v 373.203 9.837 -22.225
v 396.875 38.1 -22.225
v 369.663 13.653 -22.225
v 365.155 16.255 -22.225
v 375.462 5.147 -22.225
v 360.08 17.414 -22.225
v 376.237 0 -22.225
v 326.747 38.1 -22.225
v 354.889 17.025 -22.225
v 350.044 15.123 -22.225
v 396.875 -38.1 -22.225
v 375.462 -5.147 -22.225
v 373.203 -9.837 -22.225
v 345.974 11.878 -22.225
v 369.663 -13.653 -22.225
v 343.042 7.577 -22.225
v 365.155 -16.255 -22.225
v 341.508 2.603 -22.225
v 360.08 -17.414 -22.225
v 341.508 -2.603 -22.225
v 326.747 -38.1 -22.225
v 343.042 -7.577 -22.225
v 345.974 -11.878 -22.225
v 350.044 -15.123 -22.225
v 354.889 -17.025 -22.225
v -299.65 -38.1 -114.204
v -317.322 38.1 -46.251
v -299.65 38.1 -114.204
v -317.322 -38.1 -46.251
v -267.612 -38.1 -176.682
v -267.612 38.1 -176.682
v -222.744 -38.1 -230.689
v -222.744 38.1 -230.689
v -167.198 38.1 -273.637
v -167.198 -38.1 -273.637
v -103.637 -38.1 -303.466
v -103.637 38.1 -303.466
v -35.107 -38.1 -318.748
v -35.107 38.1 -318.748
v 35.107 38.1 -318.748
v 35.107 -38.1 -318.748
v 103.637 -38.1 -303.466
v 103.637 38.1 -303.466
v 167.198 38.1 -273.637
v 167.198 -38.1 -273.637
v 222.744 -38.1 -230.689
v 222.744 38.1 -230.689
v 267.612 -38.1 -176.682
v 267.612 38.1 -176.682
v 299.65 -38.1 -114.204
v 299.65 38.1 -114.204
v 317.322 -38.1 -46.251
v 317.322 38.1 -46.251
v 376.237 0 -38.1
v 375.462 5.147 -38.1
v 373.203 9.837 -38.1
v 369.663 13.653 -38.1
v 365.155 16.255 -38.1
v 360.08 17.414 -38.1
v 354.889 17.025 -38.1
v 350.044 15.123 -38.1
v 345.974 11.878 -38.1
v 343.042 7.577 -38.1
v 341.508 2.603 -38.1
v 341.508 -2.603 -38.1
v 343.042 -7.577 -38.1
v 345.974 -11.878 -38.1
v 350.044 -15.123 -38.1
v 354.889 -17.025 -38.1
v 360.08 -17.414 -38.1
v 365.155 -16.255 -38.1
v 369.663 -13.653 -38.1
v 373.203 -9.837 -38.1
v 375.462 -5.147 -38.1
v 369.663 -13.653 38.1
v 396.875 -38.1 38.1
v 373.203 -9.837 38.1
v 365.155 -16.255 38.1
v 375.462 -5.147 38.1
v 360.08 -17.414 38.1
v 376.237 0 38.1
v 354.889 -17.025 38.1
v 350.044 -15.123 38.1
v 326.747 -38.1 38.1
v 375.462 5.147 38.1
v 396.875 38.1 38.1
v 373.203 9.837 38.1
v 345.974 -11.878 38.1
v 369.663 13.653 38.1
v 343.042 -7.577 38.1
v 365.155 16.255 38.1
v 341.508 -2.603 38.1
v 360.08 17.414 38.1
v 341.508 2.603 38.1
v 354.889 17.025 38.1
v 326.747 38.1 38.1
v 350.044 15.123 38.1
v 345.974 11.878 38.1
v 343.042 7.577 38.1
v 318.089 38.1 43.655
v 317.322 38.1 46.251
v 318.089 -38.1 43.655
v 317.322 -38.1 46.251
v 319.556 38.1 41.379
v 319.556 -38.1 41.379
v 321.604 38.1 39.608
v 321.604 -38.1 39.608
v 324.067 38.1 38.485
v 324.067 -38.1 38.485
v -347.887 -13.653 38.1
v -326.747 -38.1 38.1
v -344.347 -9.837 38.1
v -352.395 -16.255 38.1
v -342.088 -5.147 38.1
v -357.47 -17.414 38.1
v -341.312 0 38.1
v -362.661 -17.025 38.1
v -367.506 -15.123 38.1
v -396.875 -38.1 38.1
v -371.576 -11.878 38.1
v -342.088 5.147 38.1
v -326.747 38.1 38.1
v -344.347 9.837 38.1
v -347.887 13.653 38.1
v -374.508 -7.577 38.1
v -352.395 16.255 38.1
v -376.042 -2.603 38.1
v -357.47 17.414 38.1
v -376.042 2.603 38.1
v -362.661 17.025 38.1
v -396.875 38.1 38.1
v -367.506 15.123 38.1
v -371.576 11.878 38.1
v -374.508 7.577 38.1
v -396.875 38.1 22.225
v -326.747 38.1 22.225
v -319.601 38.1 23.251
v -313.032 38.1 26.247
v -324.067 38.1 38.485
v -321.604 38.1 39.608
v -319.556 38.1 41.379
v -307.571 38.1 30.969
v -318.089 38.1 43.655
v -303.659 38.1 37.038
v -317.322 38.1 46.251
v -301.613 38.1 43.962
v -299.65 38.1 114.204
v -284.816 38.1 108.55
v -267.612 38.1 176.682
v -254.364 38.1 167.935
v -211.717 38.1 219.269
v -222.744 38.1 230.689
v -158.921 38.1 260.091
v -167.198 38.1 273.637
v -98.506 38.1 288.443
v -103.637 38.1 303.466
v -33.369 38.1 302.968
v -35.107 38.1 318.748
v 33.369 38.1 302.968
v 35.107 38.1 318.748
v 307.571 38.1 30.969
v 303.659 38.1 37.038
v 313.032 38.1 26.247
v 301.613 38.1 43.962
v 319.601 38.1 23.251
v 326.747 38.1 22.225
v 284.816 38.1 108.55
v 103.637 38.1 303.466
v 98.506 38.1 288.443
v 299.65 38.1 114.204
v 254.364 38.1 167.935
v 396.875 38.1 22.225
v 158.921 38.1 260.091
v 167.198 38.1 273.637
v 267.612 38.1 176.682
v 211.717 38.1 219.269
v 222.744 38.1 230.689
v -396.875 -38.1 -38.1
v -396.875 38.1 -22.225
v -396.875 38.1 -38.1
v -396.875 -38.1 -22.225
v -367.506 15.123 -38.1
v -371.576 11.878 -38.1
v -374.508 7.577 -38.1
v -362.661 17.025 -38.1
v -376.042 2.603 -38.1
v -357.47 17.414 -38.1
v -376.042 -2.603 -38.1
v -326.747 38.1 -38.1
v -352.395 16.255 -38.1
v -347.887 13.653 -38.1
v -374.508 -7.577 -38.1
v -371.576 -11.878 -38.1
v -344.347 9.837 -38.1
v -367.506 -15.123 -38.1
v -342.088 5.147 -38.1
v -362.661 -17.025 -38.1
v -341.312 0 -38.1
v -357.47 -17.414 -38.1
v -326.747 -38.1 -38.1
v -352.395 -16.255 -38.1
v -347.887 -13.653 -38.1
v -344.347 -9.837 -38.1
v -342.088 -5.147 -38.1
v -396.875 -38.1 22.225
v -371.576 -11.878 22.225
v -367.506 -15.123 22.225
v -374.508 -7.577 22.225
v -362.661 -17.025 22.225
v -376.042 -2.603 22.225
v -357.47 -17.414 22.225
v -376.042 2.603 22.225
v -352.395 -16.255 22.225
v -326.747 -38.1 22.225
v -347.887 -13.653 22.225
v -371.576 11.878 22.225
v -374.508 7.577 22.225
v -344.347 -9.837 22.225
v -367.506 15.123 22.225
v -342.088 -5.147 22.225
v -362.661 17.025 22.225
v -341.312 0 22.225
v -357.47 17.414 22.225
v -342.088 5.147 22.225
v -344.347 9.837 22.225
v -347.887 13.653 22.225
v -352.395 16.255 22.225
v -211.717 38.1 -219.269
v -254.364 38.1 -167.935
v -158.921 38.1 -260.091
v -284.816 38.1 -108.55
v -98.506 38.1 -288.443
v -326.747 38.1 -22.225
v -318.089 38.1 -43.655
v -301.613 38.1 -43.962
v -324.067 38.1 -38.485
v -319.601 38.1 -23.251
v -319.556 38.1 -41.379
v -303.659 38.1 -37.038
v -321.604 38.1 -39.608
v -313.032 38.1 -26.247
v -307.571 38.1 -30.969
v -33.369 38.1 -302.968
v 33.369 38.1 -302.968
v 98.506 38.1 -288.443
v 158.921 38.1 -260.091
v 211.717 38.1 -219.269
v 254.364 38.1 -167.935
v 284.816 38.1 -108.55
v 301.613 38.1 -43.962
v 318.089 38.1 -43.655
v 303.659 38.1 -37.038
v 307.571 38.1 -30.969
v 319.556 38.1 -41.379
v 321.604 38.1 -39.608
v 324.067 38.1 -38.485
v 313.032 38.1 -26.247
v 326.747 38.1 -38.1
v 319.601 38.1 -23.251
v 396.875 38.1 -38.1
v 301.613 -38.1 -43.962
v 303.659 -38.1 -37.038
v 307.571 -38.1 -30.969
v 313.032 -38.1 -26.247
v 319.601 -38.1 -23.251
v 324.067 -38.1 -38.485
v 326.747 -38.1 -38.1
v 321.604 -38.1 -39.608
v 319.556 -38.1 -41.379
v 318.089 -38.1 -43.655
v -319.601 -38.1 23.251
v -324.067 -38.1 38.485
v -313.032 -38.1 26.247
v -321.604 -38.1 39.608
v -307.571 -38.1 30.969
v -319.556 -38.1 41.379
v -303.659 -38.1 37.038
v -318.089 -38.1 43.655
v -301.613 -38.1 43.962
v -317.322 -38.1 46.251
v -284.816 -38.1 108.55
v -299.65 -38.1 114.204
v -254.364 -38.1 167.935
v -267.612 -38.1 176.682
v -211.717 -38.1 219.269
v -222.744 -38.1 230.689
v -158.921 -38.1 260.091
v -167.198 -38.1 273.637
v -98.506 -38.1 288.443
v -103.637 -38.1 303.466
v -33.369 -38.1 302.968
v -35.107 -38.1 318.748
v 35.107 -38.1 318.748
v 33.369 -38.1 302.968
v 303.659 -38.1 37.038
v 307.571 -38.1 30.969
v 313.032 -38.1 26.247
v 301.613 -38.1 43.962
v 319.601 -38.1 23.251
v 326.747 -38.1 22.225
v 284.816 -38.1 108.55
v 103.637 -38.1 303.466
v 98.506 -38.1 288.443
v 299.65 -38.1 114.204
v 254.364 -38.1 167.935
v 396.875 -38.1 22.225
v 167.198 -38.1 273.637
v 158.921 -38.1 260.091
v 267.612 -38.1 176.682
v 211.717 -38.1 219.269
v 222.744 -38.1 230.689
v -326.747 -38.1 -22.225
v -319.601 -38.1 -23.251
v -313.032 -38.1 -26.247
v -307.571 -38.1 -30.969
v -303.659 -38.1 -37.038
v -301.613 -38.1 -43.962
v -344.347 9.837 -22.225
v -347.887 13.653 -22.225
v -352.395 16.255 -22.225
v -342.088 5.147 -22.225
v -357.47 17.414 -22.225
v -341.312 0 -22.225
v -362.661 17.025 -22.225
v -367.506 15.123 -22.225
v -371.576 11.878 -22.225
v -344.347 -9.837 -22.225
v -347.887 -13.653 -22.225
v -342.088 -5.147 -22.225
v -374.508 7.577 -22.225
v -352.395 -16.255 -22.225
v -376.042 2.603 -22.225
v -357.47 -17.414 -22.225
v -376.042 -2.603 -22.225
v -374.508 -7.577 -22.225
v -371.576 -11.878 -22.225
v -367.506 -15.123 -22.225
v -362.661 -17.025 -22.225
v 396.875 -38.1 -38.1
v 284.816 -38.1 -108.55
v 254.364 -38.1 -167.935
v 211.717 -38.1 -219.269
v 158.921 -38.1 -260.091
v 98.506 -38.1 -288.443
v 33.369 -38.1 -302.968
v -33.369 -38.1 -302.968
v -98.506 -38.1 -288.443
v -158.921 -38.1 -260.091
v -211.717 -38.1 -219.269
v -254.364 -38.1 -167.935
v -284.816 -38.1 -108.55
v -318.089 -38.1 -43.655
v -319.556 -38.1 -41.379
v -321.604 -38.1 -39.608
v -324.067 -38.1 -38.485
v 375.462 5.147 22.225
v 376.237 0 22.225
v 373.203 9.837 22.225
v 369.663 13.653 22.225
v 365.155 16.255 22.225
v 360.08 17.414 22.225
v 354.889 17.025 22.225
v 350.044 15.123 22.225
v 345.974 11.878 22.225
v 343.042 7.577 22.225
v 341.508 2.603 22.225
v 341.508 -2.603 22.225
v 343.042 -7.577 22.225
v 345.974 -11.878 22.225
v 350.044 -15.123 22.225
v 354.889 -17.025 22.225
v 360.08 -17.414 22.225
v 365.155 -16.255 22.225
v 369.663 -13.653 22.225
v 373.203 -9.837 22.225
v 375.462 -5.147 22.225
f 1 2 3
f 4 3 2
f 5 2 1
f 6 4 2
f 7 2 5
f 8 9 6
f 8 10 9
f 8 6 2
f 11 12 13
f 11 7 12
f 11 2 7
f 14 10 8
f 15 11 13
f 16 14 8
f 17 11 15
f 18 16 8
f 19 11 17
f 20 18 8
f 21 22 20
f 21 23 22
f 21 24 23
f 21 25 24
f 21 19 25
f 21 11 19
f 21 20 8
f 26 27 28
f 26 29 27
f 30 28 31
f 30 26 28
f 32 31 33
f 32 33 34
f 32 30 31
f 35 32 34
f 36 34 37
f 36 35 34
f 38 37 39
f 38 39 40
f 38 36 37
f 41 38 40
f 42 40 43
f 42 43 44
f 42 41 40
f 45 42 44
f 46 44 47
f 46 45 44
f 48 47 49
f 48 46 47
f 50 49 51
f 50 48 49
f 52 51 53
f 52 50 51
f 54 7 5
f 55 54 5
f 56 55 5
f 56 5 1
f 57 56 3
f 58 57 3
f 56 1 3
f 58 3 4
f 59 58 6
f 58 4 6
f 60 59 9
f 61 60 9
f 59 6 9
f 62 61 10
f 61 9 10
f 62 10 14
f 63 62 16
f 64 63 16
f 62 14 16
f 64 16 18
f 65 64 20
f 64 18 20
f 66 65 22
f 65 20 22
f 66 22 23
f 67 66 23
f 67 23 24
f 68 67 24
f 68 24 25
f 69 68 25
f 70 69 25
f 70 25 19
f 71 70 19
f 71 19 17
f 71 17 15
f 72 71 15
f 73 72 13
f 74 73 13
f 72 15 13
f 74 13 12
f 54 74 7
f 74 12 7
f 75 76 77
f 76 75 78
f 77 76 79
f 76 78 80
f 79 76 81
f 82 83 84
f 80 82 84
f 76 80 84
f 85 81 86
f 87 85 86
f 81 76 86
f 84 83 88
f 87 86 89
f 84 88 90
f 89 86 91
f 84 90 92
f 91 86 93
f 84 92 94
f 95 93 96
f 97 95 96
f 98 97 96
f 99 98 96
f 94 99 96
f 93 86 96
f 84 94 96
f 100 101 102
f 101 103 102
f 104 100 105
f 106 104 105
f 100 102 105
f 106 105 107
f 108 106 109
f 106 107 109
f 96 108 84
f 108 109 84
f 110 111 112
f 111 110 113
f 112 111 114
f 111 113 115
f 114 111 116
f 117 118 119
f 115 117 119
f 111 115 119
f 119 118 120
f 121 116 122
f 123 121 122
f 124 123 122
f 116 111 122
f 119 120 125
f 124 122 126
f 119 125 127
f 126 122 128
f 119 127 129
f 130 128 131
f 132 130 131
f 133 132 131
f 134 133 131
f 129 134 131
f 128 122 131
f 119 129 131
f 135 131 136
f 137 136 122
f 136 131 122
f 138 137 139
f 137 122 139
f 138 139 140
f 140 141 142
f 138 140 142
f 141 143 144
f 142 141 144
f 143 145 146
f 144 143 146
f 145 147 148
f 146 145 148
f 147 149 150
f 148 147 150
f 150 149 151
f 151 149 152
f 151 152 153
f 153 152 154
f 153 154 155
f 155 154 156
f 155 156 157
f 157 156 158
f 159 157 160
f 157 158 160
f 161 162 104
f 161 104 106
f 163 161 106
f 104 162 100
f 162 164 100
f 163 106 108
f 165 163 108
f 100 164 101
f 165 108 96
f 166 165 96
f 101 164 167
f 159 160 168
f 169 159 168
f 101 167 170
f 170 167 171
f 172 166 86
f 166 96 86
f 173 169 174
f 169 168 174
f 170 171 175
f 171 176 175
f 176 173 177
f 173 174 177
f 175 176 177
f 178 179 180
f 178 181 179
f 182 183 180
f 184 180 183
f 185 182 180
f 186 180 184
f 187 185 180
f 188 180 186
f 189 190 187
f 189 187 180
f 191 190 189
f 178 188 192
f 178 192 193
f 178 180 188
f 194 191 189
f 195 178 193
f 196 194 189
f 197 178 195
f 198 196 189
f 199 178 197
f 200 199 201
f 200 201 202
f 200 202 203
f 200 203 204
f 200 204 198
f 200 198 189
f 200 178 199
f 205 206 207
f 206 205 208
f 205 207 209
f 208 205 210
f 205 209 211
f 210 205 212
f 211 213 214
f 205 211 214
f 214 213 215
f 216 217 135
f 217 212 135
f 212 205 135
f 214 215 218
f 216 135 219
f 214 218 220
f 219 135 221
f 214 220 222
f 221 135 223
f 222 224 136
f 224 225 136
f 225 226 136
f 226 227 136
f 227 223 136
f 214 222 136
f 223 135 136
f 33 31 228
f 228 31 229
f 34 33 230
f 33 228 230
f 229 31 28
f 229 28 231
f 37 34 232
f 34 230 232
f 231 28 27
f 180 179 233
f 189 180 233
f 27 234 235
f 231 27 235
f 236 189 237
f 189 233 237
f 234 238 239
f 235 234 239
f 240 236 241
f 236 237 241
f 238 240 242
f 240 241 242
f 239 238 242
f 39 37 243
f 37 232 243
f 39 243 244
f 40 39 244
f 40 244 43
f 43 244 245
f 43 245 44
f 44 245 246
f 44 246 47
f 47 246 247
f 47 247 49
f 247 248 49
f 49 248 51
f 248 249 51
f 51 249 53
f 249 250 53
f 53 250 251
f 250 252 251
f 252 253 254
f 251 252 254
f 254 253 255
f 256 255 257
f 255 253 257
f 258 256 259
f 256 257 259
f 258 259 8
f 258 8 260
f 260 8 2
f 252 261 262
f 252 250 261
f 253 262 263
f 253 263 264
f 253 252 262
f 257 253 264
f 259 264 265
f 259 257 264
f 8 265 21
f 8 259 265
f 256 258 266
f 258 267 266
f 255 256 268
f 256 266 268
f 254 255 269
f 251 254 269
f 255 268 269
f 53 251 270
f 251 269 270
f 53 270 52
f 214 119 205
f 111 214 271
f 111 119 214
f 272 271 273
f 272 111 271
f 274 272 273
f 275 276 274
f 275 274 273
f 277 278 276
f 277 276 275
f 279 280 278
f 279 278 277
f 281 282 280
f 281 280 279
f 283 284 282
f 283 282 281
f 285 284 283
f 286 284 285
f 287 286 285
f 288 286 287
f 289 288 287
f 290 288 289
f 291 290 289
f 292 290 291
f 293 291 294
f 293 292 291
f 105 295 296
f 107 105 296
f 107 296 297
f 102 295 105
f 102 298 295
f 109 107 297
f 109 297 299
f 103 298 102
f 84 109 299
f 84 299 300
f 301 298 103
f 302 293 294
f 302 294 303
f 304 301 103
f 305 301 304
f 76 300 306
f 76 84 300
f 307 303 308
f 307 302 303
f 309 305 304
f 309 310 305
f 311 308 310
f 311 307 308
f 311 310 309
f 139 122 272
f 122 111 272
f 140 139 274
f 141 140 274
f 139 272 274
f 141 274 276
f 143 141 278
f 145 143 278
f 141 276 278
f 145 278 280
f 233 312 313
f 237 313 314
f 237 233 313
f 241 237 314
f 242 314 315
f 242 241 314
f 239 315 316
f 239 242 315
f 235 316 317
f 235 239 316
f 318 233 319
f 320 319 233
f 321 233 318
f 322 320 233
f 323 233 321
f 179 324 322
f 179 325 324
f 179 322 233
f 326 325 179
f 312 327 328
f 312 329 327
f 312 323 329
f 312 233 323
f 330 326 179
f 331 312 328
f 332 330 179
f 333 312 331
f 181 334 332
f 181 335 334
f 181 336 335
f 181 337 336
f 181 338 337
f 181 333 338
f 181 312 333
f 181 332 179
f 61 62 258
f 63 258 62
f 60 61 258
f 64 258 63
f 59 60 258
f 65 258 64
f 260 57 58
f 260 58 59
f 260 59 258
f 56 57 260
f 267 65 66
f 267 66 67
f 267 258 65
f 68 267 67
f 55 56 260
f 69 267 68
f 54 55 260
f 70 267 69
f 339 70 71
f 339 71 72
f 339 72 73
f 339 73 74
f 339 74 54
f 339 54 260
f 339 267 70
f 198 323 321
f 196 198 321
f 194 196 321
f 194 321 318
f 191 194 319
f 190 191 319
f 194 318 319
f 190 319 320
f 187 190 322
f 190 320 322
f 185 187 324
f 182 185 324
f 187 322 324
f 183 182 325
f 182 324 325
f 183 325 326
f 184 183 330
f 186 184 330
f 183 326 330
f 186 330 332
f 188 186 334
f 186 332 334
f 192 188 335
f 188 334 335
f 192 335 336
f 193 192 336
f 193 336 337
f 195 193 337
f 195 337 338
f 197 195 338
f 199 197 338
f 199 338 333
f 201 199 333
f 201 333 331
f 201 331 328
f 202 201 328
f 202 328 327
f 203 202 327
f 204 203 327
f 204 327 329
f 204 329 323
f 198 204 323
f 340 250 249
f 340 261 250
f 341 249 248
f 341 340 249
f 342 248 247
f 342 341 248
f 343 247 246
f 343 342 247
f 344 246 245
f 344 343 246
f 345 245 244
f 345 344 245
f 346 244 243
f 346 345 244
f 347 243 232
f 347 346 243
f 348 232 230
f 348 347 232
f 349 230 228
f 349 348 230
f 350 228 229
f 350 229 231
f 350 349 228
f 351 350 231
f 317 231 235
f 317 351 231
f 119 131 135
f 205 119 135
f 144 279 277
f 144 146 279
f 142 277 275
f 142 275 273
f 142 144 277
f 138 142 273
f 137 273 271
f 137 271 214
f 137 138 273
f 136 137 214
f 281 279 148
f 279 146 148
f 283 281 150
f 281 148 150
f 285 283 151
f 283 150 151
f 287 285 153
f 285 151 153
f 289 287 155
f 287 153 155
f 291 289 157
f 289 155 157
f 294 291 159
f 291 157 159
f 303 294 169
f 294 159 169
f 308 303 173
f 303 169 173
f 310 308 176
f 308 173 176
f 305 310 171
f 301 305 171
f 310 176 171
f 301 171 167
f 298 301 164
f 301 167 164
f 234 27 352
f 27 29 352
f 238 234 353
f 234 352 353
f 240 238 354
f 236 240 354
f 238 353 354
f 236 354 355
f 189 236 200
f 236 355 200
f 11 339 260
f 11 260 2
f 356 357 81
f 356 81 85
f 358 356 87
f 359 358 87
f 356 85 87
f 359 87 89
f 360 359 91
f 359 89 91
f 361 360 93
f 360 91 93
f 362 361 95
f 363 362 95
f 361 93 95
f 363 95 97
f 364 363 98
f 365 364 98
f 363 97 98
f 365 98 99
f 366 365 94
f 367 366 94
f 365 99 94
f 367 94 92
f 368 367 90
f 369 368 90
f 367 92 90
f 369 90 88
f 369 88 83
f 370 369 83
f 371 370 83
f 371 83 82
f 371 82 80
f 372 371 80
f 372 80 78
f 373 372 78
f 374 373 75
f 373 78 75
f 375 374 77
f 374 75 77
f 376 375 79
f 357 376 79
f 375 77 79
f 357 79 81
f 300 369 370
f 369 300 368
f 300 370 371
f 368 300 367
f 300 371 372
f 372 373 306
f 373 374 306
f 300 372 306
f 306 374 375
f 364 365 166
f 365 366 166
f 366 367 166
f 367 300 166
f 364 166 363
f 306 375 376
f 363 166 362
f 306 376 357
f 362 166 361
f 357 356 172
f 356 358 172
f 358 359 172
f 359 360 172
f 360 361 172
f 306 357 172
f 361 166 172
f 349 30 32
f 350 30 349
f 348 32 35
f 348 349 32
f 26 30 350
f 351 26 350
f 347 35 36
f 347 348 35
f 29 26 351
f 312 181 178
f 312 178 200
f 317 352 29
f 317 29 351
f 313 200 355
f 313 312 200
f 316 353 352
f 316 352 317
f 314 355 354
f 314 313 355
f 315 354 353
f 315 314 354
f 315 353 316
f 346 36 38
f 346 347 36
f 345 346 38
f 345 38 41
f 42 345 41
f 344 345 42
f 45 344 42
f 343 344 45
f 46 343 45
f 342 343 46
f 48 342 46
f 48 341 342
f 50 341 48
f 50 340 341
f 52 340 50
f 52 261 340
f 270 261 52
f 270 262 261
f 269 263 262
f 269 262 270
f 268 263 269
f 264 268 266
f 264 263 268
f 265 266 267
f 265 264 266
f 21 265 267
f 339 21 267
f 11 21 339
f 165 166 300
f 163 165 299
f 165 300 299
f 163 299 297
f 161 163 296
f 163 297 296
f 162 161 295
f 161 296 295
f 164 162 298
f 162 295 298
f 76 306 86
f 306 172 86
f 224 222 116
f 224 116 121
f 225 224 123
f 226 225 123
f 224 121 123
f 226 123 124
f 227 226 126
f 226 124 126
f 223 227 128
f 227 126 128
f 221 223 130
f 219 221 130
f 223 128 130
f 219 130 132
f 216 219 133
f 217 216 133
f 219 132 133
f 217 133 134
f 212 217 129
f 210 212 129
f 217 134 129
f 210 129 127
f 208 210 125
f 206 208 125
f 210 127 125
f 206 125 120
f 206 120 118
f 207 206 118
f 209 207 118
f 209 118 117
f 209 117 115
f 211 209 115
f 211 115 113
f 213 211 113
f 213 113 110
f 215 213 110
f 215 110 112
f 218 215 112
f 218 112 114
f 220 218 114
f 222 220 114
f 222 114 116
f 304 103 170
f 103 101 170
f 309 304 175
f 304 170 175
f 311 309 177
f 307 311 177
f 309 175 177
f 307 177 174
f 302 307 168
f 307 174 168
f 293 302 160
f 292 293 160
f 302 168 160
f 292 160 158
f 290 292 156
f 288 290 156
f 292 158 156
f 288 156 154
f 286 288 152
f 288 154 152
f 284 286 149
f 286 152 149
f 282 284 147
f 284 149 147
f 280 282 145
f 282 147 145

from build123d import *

# Parameters (mm, degrees)
F1_DEPTH = 38.1
F2_R     = 9.525
F3_R     = 25.4
F4_R     = 17.4625
F5_DEPTH = 76.2


with BuildPart() as f1:
    # F0 (on Front) → F1 (new body, symmetric)
    with BuildSketch(Plane.XZ):
        with BuildLine():
            ThreePointArc((-303.988634, 22.225), (0, 304.8), (303.988634, 22.225))
            Line((303.988634, 22.225), (396.875, 22.225))
            Line((396.875, 22.225), (396.875, 38.1))
            Line((396.875, 38.1), (318.403589, 38.1))
            ThreePointArc((318.403589, 38.1), (0, 320.675), (-318.403589, 38.1))
            Line((-318.403589, 38.1), (-396.875, 38.1))
            Line((-396.875, 38.1), (-396.875, 22.225))
            Line((-396.875, 22.225), (-303.988634, 22.225))
        make_face()
        with BuildLine():
            Line((-396.875, -22.225), (-396.875, -38.1))
            Line((-396.875, -38.1), (-318.403589, -38.1))
            ThreePointArc((-318.403589, -38.1), (0, -320.675), (318.403589, -38.1))
            Line((318.403589, -38.1), (396.875, -38.1))
            Line((396.875, -38.1), (396.875, -22.225))
            Line((396.875, -22.225), (303.988634, -22.225))
            ThreePointArc((303.988634, -22.225), (0, -304.8), (-303.988634, -22.225))
            Line((-303.988634, -22.225), (-396.875, -22.225))
        make_face()
    extrude(amount=F1_DEPTH, both=True)

    # F2
    f2_edges = [f1.edges().sort_by_distance(p)[0] for p in [
        (-318.403589, 0, 38.1),
        (-318.403589, 0, -38.1),
        (318.403589, 0, 38.1),
        (318.403589, 0, -38.1),
    ]]
    fillet(f2_edges, radius=F2_R)

    # F3
    f3_edges = [f1.edges().sort_by_distance(p)[0] for p in [
        (-303.988634, 0, 22.225),
        (-303.988634, 0, -22.225),
        (303.988634, 0, 22.225),
        (303.988634, 0, -22.225),
    ]]
    fillet(f3_edges, radius=F3_R)

    # F4 (on face) → F5 (cut, symmetric)
    with BuildSketch(Plane.XY.offset(38.1)):
        with Locations((-358.775, 0)):
            Circle(F4_R)
        with Locations((358.775, 0)):
            Circle(F4_R)
    extrude(amount=F5_DEPTH, both=True, mode=Mode.SUBTRACT)


solid = f1.part
